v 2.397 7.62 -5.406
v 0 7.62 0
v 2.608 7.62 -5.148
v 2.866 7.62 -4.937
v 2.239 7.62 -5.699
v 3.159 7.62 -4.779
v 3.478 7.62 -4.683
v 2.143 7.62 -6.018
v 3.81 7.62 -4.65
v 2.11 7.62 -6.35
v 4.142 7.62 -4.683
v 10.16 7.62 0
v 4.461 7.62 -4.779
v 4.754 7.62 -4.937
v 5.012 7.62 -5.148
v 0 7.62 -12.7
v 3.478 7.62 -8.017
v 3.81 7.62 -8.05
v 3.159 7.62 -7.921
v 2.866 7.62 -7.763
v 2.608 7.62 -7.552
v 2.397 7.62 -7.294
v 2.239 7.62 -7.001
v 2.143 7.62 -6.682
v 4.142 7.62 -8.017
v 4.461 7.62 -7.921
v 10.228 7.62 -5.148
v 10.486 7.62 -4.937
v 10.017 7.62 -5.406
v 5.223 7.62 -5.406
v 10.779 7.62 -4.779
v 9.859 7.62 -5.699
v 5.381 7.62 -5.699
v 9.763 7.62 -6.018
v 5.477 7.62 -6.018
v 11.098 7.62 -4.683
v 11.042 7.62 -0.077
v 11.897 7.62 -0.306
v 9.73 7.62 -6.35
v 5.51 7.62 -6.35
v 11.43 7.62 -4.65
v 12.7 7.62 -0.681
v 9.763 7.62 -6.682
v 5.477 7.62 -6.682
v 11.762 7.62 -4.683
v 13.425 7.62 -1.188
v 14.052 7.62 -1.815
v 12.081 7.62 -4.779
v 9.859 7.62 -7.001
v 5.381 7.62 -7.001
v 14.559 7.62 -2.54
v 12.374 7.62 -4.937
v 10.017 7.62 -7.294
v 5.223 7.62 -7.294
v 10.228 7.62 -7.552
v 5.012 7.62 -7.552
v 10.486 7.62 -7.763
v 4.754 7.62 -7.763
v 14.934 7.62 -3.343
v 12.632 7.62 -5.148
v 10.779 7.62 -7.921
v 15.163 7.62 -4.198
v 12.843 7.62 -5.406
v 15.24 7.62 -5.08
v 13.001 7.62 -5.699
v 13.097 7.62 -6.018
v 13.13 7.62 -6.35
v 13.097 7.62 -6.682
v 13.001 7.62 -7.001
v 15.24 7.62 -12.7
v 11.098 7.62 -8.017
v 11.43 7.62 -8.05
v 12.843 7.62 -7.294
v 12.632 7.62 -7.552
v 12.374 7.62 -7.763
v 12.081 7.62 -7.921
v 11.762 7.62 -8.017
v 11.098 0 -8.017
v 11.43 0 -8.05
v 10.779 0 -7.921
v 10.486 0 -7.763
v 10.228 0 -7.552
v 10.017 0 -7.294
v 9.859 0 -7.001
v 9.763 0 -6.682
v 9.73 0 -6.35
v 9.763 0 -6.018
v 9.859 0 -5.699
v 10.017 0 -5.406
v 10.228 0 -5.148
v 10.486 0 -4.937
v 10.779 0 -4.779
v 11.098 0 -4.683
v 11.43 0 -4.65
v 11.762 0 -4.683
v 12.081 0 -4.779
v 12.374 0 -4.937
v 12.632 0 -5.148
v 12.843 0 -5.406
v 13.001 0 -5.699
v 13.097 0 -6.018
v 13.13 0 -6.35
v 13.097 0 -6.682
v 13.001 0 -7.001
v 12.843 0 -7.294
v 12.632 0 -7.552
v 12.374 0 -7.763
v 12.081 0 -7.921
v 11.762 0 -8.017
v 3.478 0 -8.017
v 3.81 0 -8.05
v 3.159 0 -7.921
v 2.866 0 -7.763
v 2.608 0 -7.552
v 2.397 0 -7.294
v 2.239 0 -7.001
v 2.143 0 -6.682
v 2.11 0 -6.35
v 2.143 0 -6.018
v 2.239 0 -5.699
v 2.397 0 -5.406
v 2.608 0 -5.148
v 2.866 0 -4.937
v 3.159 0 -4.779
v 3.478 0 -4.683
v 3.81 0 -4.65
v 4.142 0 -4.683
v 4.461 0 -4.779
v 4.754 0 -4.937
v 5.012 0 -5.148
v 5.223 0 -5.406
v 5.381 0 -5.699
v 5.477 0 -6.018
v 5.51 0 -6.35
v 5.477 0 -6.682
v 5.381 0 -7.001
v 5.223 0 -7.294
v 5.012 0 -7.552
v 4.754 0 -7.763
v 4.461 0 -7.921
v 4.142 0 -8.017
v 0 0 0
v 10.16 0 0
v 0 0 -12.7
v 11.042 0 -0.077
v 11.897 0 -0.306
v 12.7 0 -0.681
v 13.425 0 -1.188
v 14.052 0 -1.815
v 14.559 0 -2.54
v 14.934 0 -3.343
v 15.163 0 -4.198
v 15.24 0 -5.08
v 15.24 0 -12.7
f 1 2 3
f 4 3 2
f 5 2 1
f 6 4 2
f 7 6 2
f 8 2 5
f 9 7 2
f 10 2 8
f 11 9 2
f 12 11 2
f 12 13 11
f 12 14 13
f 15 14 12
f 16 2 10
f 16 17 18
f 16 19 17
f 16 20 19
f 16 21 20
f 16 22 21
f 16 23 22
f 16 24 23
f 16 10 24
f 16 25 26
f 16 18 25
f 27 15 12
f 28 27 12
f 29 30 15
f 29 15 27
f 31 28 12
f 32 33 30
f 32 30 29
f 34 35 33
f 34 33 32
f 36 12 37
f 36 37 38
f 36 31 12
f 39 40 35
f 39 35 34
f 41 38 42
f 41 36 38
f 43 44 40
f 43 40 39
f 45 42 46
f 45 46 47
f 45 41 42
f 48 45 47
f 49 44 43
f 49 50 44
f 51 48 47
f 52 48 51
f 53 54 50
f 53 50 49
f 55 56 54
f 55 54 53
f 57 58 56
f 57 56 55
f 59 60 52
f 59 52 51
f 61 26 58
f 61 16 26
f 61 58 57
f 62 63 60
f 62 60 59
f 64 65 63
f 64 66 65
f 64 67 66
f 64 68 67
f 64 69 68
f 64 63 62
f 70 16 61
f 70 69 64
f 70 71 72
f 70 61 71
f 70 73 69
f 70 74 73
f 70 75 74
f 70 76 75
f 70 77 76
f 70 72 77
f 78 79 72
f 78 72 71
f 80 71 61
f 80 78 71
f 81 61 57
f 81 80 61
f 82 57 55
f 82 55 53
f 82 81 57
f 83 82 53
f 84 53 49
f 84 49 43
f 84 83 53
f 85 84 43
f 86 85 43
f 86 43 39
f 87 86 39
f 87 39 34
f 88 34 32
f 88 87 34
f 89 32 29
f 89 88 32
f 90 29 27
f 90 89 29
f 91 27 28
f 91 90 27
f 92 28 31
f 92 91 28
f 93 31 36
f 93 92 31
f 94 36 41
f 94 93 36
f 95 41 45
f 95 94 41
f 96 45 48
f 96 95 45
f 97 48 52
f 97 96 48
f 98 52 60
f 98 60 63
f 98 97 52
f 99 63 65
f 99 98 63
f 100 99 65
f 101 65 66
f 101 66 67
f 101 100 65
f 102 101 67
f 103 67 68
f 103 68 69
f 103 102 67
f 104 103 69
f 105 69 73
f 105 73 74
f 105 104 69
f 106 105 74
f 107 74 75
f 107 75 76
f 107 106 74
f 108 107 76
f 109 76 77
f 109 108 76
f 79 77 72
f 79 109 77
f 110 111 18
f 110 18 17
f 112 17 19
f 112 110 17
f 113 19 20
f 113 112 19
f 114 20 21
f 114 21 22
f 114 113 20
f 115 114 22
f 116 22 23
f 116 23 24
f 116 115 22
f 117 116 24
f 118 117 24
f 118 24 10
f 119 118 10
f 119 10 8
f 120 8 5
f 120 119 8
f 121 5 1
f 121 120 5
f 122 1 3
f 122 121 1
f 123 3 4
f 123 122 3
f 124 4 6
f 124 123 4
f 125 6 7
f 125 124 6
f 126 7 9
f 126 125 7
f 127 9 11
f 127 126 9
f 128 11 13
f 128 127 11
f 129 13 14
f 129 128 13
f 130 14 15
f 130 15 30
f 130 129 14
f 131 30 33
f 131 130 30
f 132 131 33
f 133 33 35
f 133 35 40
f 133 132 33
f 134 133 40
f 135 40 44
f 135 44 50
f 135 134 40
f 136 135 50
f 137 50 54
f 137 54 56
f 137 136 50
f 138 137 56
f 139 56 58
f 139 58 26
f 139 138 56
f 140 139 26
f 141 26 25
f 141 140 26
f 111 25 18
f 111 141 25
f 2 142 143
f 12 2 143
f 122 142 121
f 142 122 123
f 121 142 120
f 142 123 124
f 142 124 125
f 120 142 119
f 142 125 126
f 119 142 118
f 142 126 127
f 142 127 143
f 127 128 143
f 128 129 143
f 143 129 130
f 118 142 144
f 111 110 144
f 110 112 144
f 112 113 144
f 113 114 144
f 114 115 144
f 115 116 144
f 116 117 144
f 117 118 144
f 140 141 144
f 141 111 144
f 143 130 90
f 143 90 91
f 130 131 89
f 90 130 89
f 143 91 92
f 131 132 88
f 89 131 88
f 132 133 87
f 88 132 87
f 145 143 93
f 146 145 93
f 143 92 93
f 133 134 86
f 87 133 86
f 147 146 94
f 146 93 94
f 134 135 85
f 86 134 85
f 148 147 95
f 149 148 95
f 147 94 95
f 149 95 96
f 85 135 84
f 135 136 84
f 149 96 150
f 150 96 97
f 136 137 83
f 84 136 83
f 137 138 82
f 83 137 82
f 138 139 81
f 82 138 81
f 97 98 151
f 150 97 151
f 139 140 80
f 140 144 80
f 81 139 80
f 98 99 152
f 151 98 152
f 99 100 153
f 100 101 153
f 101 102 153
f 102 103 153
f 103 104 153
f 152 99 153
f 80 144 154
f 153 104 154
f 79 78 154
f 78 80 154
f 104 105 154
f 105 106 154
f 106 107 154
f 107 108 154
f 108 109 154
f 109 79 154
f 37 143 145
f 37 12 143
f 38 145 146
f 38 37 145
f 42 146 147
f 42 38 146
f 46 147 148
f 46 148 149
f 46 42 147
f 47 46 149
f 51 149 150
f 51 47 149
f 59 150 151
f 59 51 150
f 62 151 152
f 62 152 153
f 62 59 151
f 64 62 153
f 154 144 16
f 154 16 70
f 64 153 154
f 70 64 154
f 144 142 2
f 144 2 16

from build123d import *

# Parameters (mm, degrees)
SKETCH1_W           = 15.24
SKETCH1_H           = 12.7
SKETCH1_R           = 1.7
BOSS_EXTRUDE1_DEPTH = 7.62
FILLET1_R           = 5.08


with BuildPart() as part:
    # Sketch1 → Boss-Extrude1 (new body)
    with BuildSketch(Plane(origin=(0, 0, 0), x_dir=(1, 0, 0), z_dir=(0, 1, 0))):
        with Locations((7.62, 6.35)):
            Rectangle(SKETCH1_W, SKETCH1_H)
        with Locations(Location((11.43, 6.35, 0), (0, 0, 90))):
            Circle(SKETCH1_R, mode=Mode.SUBTRACT)
        with Locations(Location((3.81, 6.35, 0), (0, 0, 90))):
            Circle(SKETCH1_R, mode=Mode.SUBTRACT)
    extrude(amount=BOSS_EXTRUDE1_DEPTH)

    # Fillet1
    fillet1_edges = [part.edges().sort_by_distance(p)[0] for p in [
        (15.24, 3.81, 0),
    ]]
    fillet(fillet1_edges, radius=FILLET1_R)


solid = part.part
